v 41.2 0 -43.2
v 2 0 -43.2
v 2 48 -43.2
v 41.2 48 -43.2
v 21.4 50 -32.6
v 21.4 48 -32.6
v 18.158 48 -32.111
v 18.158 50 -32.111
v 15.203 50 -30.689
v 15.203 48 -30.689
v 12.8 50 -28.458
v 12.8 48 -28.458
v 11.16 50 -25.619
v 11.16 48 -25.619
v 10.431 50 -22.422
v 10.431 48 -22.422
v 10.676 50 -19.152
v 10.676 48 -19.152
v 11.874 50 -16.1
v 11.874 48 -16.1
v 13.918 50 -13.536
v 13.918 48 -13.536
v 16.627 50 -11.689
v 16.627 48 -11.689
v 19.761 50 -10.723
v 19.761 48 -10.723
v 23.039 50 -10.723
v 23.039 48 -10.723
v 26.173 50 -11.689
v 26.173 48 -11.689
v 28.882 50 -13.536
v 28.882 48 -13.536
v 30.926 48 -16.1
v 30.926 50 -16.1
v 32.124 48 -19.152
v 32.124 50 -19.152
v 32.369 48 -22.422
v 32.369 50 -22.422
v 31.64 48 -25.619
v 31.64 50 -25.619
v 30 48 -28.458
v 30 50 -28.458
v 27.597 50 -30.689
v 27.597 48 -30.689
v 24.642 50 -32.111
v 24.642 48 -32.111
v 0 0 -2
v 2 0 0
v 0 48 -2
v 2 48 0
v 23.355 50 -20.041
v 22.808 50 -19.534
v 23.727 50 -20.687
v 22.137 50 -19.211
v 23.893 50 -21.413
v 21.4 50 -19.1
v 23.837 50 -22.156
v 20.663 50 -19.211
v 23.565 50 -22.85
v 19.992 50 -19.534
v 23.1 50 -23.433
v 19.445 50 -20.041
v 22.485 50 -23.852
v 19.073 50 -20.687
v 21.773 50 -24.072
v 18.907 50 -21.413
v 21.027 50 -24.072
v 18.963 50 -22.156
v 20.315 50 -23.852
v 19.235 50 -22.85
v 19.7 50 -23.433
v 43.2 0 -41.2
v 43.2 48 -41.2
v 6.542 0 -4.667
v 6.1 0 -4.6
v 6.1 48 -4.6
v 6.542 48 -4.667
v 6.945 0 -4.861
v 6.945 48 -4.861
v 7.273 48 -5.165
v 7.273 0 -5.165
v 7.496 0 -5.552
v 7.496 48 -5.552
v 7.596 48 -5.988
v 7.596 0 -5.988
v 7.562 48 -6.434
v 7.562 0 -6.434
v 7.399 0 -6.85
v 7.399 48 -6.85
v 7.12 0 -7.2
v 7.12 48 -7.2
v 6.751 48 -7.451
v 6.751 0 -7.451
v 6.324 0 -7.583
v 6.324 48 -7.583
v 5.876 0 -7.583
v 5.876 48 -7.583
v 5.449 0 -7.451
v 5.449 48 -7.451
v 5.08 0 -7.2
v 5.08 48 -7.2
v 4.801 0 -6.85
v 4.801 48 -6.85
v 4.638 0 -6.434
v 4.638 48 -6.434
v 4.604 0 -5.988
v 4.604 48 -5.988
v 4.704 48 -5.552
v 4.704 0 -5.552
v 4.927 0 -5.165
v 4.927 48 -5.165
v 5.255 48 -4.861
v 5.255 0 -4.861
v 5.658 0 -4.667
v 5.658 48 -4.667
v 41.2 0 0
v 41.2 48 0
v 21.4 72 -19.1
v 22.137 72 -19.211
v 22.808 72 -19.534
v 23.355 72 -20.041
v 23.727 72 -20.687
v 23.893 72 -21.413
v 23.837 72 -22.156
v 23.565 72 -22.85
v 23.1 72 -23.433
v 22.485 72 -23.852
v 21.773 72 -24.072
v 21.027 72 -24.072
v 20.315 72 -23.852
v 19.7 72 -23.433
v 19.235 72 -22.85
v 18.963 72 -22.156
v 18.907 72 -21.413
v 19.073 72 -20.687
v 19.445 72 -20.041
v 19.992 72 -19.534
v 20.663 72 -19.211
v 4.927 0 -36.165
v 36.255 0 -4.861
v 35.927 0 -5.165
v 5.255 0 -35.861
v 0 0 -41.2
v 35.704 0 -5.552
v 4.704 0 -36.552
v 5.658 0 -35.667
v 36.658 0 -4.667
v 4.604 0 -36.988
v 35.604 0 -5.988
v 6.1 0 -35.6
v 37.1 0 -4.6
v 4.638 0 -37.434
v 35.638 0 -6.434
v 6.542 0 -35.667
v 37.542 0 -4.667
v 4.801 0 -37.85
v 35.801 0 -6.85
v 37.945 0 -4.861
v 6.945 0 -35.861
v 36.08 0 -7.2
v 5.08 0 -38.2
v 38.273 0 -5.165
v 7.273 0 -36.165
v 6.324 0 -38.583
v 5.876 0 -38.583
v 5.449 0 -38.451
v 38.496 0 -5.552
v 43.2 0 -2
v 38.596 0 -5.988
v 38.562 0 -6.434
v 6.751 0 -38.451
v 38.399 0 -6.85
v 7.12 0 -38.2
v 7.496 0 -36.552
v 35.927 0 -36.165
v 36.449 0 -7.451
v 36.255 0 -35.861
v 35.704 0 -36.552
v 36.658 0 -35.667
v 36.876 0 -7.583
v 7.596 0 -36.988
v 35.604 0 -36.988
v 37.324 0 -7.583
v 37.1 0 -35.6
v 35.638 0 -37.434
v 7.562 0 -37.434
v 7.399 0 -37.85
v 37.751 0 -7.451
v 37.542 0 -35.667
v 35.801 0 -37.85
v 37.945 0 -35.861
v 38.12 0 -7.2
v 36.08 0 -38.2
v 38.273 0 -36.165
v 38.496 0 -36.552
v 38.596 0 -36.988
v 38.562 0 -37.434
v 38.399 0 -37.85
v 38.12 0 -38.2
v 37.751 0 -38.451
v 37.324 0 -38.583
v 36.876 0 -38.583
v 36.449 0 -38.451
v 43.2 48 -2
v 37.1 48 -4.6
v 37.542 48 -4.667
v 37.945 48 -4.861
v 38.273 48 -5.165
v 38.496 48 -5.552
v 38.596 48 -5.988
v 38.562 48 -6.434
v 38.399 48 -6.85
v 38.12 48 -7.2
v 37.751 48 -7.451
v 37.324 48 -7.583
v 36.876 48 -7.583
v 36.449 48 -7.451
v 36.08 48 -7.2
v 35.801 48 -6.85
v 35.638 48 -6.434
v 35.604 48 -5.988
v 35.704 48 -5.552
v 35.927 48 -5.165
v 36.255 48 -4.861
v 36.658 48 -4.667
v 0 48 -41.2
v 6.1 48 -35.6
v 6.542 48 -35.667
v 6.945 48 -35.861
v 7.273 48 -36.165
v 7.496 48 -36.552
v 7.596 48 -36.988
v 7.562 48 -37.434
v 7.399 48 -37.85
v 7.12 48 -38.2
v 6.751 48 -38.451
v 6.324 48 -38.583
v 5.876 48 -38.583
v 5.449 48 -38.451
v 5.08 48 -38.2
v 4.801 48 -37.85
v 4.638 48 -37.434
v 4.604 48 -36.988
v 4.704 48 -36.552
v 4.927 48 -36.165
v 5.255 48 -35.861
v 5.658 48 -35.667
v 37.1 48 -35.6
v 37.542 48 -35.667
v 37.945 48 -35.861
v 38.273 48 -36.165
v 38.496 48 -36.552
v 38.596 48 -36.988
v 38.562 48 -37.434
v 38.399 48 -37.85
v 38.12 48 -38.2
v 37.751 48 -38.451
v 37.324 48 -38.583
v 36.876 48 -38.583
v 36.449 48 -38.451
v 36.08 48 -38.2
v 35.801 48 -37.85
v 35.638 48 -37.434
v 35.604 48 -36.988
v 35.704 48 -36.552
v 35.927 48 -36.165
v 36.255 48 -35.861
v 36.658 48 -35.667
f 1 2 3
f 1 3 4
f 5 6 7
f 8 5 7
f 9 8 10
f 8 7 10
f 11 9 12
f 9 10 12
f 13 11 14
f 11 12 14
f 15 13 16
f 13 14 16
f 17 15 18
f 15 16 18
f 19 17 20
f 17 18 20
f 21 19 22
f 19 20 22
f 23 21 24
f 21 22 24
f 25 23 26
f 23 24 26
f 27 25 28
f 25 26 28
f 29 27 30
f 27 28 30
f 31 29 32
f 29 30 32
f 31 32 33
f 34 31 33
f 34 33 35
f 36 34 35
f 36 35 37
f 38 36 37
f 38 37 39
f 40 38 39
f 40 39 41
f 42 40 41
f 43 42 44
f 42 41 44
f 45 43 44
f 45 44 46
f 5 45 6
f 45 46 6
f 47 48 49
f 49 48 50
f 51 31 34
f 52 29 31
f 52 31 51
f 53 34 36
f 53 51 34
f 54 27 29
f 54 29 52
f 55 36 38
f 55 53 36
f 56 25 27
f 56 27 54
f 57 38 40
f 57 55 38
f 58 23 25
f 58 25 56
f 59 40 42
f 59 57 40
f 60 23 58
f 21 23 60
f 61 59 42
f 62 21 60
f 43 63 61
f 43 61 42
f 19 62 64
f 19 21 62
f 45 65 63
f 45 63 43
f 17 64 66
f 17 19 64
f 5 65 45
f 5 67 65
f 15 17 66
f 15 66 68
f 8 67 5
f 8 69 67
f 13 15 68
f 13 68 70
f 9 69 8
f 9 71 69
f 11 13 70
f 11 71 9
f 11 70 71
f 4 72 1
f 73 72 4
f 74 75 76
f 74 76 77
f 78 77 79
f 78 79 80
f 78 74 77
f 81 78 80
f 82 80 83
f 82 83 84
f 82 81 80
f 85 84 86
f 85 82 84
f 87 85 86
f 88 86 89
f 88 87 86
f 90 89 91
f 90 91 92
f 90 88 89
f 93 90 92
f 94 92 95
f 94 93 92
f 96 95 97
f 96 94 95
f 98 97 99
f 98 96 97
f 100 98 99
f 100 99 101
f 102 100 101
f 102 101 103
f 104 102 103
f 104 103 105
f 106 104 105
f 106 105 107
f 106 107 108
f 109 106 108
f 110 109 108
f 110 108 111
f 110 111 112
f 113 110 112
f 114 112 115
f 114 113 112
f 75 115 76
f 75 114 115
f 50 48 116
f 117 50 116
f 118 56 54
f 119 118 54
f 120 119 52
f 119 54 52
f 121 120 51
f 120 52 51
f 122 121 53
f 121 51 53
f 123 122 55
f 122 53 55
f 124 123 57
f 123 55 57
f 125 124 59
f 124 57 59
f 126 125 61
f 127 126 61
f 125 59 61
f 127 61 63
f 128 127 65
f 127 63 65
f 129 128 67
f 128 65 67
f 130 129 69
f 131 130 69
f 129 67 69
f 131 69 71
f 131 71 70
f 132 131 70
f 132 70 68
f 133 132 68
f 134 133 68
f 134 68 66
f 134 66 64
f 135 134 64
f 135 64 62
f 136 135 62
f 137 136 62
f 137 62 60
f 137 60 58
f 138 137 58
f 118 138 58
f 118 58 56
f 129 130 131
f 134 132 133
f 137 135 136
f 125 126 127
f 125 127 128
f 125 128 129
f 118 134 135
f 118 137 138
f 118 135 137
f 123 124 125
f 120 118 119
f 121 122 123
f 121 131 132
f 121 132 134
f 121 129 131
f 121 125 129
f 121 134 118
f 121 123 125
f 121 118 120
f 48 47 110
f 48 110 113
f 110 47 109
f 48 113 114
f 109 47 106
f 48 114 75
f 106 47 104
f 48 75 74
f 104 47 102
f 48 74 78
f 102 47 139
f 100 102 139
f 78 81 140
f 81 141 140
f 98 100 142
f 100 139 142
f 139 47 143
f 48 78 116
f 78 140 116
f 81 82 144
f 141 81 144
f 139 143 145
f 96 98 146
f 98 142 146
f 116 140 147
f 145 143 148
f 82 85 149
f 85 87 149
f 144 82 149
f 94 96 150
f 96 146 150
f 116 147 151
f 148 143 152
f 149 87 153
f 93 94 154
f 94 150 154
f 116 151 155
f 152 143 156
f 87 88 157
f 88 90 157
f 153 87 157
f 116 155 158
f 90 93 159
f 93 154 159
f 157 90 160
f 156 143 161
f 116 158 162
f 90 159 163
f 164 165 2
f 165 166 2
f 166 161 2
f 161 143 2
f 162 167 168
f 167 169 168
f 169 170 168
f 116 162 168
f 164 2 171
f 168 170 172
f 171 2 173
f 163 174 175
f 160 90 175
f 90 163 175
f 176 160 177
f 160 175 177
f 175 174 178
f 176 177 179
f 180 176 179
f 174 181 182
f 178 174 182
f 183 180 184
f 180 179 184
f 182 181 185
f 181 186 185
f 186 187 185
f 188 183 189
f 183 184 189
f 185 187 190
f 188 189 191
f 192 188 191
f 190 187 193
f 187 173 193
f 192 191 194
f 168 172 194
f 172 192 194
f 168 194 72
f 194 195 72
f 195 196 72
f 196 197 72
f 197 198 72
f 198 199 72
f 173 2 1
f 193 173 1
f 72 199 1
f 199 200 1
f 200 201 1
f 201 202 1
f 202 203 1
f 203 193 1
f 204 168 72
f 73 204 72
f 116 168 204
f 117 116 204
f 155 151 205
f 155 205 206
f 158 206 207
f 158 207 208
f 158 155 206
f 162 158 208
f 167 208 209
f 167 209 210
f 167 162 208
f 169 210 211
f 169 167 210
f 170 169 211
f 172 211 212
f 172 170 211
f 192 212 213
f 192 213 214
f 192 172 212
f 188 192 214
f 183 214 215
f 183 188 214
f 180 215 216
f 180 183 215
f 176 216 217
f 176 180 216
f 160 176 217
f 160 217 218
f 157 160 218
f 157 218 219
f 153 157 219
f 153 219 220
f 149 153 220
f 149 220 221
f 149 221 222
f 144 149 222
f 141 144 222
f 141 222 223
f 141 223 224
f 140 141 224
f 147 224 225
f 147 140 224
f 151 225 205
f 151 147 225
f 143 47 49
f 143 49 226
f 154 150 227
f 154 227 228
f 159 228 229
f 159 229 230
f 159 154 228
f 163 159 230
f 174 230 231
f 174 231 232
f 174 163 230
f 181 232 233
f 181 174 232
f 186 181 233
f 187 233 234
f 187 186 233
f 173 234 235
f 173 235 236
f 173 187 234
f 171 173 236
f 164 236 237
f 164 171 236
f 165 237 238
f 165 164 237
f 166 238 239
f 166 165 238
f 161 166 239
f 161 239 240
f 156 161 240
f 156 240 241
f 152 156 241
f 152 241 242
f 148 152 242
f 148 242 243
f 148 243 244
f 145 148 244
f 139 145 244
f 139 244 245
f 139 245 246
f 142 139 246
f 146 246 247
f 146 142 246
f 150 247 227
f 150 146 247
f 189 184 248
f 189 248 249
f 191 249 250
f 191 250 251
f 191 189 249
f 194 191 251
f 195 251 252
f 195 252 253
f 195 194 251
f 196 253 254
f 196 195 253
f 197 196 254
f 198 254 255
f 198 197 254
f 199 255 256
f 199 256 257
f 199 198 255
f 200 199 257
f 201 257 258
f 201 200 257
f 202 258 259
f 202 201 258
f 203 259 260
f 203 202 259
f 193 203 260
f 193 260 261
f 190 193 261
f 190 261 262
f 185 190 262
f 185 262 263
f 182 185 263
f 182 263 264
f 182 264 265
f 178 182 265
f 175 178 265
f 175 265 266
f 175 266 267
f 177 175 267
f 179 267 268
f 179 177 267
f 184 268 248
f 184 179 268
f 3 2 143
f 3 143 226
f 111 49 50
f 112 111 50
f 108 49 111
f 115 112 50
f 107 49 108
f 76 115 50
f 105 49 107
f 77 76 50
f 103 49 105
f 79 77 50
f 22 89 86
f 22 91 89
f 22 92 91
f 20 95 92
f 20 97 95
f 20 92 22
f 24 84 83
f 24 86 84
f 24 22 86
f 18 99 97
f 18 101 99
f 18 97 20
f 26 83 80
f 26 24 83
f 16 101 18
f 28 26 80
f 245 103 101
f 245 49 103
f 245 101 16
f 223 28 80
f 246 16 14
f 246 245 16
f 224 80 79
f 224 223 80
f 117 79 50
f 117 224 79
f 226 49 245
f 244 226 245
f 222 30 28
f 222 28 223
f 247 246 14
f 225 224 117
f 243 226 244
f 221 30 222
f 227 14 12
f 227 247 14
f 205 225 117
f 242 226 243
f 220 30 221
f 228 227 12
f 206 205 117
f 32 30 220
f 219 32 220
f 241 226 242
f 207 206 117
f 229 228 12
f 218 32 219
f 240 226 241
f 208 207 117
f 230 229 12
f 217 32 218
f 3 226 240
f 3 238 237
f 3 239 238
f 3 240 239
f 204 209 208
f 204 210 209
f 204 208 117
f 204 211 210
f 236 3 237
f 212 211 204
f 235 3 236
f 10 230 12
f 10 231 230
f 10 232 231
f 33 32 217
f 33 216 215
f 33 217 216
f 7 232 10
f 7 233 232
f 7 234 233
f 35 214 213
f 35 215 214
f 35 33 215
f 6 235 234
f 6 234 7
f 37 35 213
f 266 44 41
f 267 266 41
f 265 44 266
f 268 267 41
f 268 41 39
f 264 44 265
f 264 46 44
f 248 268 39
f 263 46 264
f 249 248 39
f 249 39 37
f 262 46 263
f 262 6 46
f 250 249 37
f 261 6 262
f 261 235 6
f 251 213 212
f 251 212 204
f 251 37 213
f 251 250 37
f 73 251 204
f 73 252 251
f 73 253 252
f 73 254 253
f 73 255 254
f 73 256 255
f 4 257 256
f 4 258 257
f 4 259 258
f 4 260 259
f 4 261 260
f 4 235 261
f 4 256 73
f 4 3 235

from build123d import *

# Parameters (mm, degrees)
SKETCH1_W           = 43.2
SKETCH1_H           = 43.2
SKETCH1_R           = 1.5
BOSS_EXTRUDE1_DEPTH = 48
CHAMFER1_SIZE       = 2
SKETCH2_R           = 11
BOSS_EXTRUDE2_DEPTH = 2
SKETCH3_R           = 2.5
BOSS_EXTRUDE3_DEPTH = 24


with BuildPart() as part:
    # Sketch1 → Boss-Extrude1 (new body)
    with BuildSketch(Plane(origin=(0, 0, 0), x_dir=(1, 0, 0), z_dir=(0, 1, 0))):
        with Locations((21.6, 21.6)):
            Rectangle(SKETCH1_W, SKETCH1_H)
        with Locations(Location((6.1, 37.1, 0), (0, 0, 270))):
            Circle(SKETCH1_R, mode=Mode.SUBTRACT)
        with Locations(Location((37.1, 37.1, 0), (0, 0, 270))):
            Circle(SKETCH1_R, mode=Mode.SUBTRACT)
        with Locations(Location((37.1, 6.1, 0), (0, 0, 270))):
            Circle(SKETCH1_R, mode=Mode.SUBTRACT)
        with Locations(Location((6.1, 6.1, 0), (0, 0, 270))):
            Circle(SKETCH1_R, mode=Mode.SUBTRACT)
    extrude(amount=BOSS_EXTRUDE1_DEPTH)

    # Chamfer1
    chamfer1_edges = [part.edges().sort_by_distance(p)[0] for p in [
        (0, 24, -43.2),
        (43.2, 24, -43.2),
        (43.2, 24, 0),
        (0, 24, 0),
    ]]
    chamfer(chamfer1_edges, length=CHAMFER1_SIZE)

    # Sketch2 → Boss-Extrude2 (add)
    with BuildSketch(Plane(origin=(0, 48, 0), x_dir=(1, 0, 0), z_dir=(0, 1, 0))):
        with Locations(Location((21.4, 21.6, 0), (0, 0, 90))):
            Circle(SKETCH2_R)
    extrude(amount=BOSS_EXTRUDE2_DEPTH)

    # Sketch3 → Boss-Extrude3 (add)
    with BuildSketch(Plane(origin=(0, 48, 0), x_dir=(1, 0, 0), z_dir=(0, 1, 0))):
        with Locations(Location((21.4, 21.6, 0), (0, 0, 270))):
            Circle(SKETCH3_R)
    extrude(amount=BOSS_EXTRUDE3_DEPTH)


solid = part.part
